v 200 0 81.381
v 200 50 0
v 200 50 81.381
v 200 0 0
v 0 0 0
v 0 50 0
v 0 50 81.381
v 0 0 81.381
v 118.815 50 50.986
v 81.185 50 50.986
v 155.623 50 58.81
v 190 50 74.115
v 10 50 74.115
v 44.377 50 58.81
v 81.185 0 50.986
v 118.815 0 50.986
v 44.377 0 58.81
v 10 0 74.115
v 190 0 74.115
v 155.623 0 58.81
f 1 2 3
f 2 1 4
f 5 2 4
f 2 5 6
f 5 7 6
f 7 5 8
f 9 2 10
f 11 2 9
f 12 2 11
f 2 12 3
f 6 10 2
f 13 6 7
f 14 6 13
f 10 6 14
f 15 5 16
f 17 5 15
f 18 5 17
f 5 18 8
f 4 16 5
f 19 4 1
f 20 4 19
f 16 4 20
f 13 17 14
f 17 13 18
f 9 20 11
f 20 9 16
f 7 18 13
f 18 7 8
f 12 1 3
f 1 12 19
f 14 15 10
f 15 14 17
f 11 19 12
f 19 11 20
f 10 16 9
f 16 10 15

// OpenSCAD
// Stand for holding a pipe horizontally

// Dimensions
box_length = 200;    // mm, length along x-axis
box_width = 50;      // mm, width along y-axis
box_height = 180;    // mm, height along z-axis
hole_radius = 180;   // mm, as specified
hole_axis_z = 50 + hole_radius;  // Axis at z = 50 + 180 = 230 mm

// Create the stand with a horizontal through-hole
difference() {
    // Base box
    cube([box_length, box_width, box_height]);
    
    // Horizontal cylindrical hole along y-axis
    translate([box_length / 2, box_width / 2, hole_axis_z]) // Center in x and y, axis at z=230
        rotate([90, 0, 0]) // Rotate to align along y-axis
        cylinder(h=box_width + 10, r=hole_radius, center=true); // Length > 50 mm to cut through
}
